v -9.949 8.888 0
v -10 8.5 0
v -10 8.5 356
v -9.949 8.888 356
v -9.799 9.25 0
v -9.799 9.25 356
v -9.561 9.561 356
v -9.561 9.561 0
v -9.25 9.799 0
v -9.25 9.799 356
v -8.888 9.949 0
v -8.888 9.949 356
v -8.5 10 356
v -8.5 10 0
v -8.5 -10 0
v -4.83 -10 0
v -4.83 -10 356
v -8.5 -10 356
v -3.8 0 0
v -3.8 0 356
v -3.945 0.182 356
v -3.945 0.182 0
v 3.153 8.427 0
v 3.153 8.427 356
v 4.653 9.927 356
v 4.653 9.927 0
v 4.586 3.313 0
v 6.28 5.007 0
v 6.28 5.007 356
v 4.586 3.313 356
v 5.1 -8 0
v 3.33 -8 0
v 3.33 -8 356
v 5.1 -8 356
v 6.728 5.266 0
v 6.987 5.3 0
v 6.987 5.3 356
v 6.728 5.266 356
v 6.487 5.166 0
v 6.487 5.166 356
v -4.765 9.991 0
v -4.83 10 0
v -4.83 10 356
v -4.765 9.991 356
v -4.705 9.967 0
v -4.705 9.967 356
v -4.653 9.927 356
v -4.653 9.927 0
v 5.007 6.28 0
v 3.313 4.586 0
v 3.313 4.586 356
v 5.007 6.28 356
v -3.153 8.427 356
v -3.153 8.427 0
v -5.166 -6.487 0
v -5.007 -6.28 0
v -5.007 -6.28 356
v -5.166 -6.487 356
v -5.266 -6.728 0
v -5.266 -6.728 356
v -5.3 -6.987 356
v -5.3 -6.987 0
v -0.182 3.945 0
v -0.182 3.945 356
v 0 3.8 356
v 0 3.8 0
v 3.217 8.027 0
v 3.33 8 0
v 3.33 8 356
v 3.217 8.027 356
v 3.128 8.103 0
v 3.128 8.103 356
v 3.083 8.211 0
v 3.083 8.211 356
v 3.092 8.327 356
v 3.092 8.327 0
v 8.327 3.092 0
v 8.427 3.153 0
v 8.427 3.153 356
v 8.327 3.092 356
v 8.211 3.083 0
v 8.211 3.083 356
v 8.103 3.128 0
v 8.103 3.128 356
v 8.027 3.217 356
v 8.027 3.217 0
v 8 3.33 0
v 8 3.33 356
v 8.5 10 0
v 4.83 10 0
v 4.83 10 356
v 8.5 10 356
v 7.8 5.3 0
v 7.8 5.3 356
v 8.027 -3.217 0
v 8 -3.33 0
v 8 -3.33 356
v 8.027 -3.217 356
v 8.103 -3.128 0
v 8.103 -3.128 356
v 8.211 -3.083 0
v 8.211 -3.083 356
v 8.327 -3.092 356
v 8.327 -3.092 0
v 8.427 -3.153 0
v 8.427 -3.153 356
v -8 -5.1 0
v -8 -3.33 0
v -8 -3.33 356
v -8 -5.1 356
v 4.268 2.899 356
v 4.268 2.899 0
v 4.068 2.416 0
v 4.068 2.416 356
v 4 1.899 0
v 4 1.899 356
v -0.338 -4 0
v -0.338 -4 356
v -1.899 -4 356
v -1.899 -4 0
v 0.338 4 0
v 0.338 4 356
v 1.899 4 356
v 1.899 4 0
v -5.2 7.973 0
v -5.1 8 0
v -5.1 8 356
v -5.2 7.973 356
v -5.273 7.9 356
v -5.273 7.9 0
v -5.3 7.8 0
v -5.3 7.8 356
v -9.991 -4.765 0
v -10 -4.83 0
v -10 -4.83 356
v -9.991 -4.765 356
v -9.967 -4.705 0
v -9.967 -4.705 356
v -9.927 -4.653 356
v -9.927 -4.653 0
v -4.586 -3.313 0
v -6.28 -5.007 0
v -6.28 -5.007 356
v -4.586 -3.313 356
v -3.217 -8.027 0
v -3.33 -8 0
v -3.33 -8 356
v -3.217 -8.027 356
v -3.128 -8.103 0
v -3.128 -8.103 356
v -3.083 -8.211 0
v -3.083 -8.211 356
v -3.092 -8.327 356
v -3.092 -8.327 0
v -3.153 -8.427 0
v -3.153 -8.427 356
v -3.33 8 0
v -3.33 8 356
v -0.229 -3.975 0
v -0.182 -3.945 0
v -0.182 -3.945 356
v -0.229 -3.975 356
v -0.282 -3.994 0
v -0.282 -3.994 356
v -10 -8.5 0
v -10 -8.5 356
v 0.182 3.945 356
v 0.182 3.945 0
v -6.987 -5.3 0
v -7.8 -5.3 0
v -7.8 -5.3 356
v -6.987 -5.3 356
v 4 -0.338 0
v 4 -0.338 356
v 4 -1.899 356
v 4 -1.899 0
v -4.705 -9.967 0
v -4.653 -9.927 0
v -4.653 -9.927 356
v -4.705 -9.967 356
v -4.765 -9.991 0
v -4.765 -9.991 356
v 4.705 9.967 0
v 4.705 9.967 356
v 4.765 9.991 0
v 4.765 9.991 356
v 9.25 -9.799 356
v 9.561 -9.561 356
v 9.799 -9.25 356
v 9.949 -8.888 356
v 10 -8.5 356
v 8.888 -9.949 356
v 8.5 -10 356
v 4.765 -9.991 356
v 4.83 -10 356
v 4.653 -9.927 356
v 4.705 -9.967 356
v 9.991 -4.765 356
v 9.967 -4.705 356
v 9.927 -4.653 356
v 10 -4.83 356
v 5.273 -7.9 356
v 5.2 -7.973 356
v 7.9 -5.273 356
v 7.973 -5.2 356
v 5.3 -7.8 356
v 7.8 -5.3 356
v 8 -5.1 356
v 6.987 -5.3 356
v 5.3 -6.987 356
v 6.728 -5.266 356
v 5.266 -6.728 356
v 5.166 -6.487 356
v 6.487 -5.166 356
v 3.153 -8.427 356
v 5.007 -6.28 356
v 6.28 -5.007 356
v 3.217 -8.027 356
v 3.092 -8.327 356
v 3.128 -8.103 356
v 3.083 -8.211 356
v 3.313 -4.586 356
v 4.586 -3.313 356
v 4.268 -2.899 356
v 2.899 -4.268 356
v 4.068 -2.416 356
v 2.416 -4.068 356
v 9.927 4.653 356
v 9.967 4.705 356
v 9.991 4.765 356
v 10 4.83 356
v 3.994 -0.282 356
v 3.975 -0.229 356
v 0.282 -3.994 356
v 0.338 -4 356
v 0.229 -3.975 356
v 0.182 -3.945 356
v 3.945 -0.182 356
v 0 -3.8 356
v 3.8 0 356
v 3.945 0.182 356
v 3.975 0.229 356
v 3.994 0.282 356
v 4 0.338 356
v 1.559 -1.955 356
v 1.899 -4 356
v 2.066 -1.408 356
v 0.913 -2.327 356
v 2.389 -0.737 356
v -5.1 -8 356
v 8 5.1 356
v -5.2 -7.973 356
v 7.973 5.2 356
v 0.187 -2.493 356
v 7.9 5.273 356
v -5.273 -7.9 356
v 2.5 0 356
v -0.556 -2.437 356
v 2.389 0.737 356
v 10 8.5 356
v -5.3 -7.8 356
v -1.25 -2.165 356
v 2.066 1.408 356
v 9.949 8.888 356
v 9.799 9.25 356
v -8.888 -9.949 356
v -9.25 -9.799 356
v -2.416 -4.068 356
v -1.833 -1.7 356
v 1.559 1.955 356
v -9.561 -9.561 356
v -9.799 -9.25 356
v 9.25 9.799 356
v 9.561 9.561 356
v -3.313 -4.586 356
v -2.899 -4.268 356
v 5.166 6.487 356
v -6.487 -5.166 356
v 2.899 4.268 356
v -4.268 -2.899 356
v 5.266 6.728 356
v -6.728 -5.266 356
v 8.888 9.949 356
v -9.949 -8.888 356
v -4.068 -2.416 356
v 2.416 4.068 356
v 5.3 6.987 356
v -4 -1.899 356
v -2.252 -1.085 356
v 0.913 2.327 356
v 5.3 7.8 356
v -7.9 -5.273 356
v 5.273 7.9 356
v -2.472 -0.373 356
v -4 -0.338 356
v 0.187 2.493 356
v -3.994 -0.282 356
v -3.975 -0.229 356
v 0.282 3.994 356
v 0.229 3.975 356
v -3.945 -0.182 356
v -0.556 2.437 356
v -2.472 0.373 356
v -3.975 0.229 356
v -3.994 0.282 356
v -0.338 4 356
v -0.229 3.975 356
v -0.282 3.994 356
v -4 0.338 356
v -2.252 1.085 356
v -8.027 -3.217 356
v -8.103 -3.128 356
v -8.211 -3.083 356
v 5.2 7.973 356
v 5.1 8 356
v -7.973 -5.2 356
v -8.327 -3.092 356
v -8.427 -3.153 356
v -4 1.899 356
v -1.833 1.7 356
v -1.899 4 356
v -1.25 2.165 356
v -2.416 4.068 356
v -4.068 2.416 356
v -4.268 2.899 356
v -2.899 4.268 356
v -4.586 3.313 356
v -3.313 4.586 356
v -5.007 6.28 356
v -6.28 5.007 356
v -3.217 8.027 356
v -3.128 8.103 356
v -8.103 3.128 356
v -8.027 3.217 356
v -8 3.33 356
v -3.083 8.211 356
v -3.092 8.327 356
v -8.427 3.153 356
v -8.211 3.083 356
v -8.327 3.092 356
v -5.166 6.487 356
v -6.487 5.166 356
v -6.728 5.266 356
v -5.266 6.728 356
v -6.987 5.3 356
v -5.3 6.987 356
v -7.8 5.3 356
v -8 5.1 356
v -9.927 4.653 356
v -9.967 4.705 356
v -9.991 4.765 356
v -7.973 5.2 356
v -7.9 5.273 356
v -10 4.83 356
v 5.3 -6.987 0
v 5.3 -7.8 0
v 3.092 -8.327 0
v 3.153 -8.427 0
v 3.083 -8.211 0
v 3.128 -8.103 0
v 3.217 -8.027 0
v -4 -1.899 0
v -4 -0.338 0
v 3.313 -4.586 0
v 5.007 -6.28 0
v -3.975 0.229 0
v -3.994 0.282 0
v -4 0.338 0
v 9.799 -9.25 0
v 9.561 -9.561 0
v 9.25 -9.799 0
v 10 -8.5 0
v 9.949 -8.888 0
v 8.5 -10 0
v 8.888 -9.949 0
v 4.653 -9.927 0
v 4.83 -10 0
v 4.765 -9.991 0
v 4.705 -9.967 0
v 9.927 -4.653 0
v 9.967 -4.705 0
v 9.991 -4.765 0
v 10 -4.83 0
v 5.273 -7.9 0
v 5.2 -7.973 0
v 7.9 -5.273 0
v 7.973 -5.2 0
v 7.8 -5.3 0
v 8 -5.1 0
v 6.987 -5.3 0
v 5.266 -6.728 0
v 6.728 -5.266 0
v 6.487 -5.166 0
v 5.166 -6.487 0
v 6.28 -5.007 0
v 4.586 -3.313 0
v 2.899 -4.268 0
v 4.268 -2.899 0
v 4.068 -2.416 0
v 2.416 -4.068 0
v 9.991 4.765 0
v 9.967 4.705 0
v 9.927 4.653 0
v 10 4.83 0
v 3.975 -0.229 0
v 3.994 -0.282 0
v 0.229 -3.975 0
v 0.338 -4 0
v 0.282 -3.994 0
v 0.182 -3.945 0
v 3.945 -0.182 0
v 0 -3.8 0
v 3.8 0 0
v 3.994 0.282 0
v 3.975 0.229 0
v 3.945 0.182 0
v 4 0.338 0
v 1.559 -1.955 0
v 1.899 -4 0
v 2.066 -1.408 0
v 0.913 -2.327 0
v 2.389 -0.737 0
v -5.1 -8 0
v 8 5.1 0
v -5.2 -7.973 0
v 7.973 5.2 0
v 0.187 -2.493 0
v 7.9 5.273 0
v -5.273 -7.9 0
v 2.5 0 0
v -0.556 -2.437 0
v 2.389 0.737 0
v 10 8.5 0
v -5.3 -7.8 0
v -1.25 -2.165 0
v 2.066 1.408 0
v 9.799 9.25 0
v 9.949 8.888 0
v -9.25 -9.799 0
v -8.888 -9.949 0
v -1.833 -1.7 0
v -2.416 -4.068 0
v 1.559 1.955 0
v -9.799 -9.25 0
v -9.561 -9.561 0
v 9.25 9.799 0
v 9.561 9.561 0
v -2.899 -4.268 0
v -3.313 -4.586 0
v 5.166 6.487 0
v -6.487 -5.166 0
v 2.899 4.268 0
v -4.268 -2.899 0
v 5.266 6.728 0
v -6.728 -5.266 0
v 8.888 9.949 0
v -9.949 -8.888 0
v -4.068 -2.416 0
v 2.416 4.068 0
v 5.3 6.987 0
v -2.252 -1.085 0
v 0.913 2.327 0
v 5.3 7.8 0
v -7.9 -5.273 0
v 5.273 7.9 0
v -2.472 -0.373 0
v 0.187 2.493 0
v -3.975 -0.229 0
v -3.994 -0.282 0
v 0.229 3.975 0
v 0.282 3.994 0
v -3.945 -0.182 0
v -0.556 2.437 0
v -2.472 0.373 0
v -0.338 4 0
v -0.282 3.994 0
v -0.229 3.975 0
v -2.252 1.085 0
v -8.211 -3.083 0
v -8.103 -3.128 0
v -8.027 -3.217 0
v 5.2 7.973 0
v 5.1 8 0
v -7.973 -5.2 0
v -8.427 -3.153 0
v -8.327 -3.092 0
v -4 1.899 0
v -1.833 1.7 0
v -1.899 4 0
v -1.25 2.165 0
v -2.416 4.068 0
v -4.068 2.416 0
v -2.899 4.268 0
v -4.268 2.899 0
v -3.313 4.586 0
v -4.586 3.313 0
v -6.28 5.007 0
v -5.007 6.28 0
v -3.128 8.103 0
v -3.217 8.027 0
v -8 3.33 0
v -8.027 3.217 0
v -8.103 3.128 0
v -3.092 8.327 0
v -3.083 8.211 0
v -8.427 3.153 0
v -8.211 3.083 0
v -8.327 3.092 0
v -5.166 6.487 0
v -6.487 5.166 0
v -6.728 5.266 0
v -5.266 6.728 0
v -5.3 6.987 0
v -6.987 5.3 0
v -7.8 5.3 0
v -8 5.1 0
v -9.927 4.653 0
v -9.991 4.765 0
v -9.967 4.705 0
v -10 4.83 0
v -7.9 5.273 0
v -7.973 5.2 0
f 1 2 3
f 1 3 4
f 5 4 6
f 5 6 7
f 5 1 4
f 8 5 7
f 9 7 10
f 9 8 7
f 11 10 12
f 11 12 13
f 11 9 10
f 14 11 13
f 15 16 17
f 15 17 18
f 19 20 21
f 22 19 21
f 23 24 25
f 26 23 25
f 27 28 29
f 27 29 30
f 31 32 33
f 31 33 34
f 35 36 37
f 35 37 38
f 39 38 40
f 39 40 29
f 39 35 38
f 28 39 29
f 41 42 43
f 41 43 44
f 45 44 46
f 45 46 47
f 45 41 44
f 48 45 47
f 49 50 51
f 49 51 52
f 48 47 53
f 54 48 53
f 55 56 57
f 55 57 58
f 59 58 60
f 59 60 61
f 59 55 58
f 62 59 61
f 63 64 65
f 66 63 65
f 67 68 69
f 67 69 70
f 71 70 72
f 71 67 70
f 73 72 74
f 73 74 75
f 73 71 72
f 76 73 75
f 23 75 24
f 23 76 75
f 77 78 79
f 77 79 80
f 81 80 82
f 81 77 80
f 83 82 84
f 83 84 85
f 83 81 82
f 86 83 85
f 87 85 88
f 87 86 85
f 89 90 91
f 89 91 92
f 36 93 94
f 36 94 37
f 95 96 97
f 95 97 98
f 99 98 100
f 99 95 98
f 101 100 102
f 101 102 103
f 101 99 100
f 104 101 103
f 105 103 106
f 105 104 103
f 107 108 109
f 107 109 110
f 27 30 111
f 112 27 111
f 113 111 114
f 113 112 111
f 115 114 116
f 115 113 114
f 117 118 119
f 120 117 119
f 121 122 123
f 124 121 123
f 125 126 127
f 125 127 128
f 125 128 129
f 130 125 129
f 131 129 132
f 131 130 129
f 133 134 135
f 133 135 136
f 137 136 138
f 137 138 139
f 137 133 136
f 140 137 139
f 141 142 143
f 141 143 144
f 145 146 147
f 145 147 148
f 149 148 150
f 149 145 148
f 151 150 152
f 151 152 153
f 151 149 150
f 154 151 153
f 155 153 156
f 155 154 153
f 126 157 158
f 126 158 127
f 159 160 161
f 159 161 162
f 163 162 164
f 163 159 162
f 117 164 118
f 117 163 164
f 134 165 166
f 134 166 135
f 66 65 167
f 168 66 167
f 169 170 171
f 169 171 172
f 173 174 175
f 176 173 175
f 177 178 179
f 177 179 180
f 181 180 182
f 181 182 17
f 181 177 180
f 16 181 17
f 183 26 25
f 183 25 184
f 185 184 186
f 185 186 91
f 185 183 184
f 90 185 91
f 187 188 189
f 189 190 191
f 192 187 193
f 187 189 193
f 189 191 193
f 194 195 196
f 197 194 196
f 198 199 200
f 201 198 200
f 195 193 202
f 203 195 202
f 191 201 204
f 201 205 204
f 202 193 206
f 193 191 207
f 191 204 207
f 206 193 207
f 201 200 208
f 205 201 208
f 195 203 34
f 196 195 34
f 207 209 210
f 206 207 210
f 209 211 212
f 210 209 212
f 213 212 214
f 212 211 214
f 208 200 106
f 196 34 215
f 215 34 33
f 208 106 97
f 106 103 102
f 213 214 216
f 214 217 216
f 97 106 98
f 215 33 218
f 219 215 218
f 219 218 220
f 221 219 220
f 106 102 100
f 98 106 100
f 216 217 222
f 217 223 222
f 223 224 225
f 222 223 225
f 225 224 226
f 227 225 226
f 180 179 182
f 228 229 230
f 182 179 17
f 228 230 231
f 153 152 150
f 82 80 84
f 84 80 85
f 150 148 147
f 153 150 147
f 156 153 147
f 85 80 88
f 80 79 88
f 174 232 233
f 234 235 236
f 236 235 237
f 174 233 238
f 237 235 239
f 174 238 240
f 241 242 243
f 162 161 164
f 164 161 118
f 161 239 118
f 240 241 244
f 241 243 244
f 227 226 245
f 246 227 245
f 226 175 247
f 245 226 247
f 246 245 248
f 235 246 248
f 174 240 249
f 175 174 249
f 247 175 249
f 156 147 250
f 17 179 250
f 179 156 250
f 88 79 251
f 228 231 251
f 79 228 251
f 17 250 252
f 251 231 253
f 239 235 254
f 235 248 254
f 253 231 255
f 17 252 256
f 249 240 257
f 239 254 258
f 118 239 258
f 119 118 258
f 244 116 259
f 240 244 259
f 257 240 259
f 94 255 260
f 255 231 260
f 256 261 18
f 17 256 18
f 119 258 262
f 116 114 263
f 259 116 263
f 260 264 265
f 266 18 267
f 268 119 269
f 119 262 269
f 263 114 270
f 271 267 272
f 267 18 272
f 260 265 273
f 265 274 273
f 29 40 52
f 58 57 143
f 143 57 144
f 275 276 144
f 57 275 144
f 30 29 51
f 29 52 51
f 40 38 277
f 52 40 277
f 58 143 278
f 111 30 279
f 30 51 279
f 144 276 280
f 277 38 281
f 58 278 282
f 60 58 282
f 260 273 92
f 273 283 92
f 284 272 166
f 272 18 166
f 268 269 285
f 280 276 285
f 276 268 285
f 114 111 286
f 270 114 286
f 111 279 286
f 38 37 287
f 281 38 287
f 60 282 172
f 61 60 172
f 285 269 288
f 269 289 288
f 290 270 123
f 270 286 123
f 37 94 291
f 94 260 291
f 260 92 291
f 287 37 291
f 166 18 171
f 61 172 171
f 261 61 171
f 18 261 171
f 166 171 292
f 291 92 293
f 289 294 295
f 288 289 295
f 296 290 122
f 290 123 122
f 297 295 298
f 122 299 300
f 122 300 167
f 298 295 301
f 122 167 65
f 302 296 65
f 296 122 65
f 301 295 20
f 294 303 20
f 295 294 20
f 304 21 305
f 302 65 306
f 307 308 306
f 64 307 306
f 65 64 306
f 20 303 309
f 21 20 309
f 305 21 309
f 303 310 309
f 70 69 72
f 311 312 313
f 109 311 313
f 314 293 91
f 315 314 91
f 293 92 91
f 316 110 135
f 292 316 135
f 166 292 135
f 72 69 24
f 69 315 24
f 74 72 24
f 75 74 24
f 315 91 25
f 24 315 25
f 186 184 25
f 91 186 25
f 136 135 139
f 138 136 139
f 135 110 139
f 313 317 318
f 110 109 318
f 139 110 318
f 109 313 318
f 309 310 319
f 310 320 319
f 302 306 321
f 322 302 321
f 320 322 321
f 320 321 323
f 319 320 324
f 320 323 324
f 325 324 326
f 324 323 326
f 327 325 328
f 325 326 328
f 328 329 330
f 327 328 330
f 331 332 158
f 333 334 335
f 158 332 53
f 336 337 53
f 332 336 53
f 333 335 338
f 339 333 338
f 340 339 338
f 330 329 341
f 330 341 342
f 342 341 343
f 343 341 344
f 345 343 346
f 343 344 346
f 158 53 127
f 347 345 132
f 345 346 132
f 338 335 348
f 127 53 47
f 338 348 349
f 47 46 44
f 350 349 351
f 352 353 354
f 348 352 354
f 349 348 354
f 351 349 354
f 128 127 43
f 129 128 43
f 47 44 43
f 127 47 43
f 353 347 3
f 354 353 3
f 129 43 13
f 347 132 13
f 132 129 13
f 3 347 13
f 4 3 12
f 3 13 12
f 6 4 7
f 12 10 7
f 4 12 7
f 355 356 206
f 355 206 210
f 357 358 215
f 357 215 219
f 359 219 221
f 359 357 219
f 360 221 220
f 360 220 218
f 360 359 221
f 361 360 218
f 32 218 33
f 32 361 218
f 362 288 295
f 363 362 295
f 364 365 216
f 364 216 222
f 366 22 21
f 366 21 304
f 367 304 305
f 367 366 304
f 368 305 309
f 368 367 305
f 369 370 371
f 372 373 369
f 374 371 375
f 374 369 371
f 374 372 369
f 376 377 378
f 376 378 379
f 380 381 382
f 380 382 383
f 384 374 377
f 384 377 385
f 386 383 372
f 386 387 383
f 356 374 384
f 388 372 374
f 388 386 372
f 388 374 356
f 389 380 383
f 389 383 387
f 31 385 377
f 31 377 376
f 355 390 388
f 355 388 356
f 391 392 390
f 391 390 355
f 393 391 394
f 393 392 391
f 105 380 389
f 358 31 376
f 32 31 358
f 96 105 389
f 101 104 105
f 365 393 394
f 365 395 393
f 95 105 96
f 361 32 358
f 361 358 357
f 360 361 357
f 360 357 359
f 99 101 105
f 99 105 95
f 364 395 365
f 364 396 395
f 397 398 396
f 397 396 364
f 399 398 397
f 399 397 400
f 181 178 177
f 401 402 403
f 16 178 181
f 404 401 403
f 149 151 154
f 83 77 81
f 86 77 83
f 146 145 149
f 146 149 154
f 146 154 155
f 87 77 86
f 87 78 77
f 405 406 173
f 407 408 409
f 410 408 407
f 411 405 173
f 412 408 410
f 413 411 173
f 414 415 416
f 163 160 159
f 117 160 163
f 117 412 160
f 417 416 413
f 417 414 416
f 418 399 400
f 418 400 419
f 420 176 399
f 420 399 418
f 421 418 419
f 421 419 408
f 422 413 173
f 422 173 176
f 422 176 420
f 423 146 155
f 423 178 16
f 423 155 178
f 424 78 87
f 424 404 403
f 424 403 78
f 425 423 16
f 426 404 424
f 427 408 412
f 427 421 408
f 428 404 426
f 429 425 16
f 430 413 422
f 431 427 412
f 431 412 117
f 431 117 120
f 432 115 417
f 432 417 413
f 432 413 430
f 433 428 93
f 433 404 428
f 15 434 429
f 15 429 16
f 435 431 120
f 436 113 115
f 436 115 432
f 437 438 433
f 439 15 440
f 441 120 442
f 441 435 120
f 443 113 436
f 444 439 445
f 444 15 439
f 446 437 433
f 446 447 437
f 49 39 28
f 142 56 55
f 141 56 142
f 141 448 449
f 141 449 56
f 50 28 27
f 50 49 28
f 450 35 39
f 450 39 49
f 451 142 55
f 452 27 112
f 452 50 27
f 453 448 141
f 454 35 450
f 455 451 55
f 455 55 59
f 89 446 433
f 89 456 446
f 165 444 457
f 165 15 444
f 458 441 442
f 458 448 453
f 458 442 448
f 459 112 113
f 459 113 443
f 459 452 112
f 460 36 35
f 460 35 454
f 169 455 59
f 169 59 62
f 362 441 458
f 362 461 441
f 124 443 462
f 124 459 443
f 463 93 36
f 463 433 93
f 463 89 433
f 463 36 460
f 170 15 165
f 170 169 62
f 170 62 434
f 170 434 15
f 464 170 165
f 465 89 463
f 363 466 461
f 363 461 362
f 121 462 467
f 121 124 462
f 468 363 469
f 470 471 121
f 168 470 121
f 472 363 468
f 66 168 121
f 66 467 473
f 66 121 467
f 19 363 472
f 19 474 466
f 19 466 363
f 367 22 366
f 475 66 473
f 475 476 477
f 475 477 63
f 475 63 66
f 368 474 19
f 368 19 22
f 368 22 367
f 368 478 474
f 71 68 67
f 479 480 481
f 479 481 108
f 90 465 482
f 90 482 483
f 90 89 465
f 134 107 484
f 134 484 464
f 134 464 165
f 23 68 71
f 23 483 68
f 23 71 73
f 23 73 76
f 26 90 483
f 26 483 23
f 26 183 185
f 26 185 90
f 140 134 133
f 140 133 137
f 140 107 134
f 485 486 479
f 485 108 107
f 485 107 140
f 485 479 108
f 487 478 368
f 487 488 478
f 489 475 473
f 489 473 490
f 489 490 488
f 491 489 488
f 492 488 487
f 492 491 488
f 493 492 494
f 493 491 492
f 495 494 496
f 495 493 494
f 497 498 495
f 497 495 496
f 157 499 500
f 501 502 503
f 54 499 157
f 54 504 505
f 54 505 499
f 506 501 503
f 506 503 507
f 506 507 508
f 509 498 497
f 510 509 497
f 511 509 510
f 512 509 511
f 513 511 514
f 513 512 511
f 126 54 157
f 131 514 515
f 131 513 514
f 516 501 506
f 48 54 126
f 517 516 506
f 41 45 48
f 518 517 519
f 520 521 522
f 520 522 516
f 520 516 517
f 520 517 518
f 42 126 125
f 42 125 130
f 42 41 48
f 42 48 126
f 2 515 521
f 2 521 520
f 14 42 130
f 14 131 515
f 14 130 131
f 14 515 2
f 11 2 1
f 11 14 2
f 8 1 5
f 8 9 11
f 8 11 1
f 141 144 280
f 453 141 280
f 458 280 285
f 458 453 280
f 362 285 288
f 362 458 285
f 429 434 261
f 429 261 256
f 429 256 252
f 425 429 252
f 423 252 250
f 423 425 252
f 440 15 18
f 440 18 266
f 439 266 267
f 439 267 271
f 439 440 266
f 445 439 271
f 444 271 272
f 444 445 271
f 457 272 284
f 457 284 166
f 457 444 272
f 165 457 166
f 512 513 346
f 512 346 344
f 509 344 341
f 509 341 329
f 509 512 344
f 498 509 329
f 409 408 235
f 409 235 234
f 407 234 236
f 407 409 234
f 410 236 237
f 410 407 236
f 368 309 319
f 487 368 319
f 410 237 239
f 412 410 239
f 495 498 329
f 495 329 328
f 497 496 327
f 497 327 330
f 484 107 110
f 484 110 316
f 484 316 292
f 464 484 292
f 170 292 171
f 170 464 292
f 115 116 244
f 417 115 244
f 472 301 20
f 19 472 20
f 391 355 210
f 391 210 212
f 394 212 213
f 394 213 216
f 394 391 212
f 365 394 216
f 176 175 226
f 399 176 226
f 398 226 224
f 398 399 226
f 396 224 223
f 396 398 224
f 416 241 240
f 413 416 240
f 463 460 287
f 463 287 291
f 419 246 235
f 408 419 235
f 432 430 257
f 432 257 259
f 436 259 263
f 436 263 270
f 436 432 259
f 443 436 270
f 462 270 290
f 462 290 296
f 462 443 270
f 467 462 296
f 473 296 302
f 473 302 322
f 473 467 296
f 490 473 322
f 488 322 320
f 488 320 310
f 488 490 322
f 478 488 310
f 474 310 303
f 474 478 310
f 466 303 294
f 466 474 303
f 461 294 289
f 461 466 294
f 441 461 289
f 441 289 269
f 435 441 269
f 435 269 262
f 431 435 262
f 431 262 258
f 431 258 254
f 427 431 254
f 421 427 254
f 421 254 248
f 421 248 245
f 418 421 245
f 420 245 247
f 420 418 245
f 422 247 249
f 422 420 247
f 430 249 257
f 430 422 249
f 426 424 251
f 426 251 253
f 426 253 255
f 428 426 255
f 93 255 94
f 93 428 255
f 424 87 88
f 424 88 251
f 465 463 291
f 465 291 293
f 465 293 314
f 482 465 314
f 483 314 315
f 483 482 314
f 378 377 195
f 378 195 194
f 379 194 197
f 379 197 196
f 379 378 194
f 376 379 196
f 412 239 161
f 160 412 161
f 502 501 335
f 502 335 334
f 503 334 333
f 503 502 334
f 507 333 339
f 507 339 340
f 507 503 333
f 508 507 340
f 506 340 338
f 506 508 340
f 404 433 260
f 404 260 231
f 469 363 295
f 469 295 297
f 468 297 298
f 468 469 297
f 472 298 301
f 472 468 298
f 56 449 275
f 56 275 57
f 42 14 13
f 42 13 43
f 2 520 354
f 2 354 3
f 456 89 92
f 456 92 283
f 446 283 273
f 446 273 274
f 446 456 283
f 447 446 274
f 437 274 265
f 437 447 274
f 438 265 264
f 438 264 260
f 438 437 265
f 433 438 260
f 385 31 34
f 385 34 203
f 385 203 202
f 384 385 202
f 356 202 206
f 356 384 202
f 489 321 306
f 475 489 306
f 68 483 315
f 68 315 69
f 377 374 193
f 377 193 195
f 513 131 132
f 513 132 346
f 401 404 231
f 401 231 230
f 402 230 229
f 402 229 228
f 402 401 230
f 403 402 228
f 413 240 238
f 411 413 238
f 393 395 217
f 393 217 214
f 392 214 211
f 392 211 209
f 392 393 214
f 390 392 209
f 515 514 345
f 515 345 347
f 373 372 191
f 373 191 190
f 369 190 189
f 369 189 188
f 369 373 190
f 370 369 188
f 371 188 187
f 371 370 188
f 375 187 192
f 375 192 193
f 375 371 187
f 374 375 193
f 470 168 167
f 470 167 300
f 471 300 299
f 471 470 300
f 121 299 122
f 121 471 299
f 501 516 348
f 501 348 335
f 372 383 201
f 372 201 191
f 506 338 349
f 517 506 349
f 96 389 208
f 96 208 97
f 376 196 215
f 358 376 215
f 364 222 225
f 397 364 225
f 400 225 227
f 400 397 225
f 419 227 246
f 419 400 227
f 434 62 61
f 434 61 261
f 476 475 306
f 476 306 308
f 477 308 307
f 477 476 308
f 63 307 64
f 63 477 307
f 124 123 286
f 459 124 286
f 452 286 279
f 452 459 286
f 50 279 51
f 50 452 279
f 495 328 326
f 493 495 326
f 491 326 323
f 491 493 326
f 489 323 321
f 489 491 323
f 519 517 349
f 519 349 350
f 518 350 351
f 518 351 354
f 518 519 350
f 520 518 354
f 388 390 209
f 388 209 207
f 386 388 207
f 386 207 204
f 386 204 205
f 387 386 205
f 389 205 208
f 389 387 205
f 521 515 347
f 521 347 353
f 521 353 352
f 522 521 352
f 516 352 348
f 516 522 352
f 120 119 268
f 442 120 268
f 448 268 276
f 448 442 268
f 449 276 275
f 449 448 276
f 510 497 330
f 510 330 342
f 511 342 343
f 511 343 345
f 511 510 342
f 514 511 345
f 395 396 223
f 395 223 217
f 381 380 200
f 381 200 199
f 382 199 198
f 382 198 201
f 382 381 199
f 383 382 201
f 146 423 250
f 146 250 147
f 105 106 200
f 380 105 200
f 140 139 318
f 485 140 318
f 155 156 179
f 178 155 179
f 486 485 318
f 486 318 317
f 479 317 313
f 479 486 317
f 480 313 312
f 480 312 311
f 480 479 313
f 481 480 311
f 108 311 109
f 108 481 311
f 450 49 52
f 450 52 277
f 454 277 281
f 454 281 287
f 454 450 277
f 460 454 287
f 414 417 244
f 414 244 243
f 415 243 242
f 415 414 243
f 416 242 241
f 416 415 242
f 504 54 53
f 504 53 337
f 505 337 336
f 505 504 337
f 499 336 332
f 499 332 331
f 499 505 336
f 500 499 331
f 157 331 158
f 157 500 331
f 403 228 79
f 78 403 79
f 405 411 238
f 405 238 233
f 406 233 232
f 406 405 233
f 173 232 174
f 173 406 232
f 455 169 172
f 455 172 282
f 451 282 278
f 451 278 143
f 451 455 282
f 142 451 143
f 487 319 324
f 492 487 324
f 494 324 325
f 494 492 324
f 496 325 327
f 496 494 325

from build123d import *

# Parameters (mm, degrees)
MODEL_R             = 2.5
EXTRUDED_BODY_DEPTH = 356


with BuildPart() as part:
    # Model → Extruded body (new body)
    with BuildSketch(Plane.XY):
        with BuildLine():
            Line((-4, 0.337695265), (-4, 1.898780669))
            ThreePointArc((-4, 1.898780669), (-4.152240935, 2.664147534), (-4.585786438, 3.312994231))
            Line((-4.585786438, 3.312994231), (-6.279898987, 5.007106781))
            ThreePointArc((-6.279898987, 5.007106781), (-6.604322336, 5.223879533), (-6.987005769, 5.3))
            Line((-6.987005769, 5.3), (-7.8, 5.3))
            ThreePointArc((-7.8, 5.3), (-7.941421356, 5.241421356), (-8, 5.1))
            Line((-8, 5.1), (-8, 3.33))
            ThreePointArc((-8, 3.33), (-8.154329142, 3.099030117), (-8.426776695, 3.153223305))
            Line((-8.426776695, 3.153223305), (-9.926776695, 4.653223305))
            ThreePointArc((-9.926776695, 4.653223305), (-9.980969883, 4.734329142), (-10, 4.83))
            Line((-10, 4.83), (-10, 8.5))
            ThreePointArc((-10, 8.5), (-9.560660172, 9.560660172), (-8.5, 10))
            Line((-8.5, 10), (-4.83, 10))
            ThreePointArc((-4.83, 10), (-4.734329142, 9.980969883), (-4.653223305, 9.926776695))
            Line((-4.653223305, 9.926776695), (-3.153223305, 8.426776695))
            ThreePointArc((-3.153223305, 8.426776695), (-3.099030117, 8.154329142), (-3.33, 8))
            Line((-3.33, 8), (-5.1, 8))
            ThreePointArc((-5.1, 8), (-5.241421356, 7.941421356), (-5.3, 7.8))
            Line((-5.3, 7.8), (-5.3, 6.987005769))
            ThreePointArc((-5.3, 6.987005769), (-5.223879533, 6.604322336), (-5.007106781, 6.279898987))
            Line((-5.007106781, 6.279898987), (-3.312994231, 4.585786438))
            ThreePointArc((-3.312994231, 4.585786438), (-2.664147534, 4.152240935), (-1.898780669, 4))
            Line((-1.898780669, 4), (-0.337695265, 4))
            ThreePointArc((-0.337695265, 4), (-0.254943529, 3.98590708), (-0.181521503, 3.945217202))
            Line((-0.181521503, 3.945217202), (0, 3.8))
            Line((0, 3.8), (0.181521503, 3.945217202))
            ThreePointArc((0.181521503, 3.945217202), (0.254943529, 3.98590708), (0.337695265, 4))
            Line((0.337695265, 4), (1.898780669, 4))
            ThreePointArc((1.898780669, 4), (2.664147534, 4.152240935), (3.312994231, 4.585786438))
            Line((3.312994231, 4.585786438), (5.007106781, 6.279898987))
            ThreePointArc((5.007106781, 6.279898987), (5.223879533, 6.604322336), (5.3, 6.987005769))
            Line((5.3, 6.987005769), (5.3, 7.8))
            ThreePointArc((5.3, 7.8), (5.241421356, 7.941421356), (5.1, 8))
            Line((5.1, 8), (3.33, 8))
            ThreePointArc((3.33, 8), (3.099030117, 8.154329142), (3.153223305, 8.426776695))
            Line((3.153223305, 8.426776695), (4.653223305, 9.926776695))
            ThreePointArc((4.653223305, 9.926776695), (4.734329142, 9.980969883), (4.83, 10))
            Line((4.83, 10), (8.5, 10))
            ThreePointArc((8.5, 10), (9.560660172, 9.560660172), (10, 8.5))
            Line((10, 8.5), (10, 4.83))
            ThreePointArc((10, 4.83), (9.980969883, 4.734329142), (9.926776695, 4.653223305))
            Line((9.926776695, 4.653223305), (8.426776695, 3.153223305))
            ThreePointArc((8.426776695, 3.153223305), (8.154329142, 3.099030117), (8, 3.33))
            Line((8, 3.33), (8, 5.1))
            ThreePointArc((8, 5.1), (7.941421356, 5.241421356), (7.8, 5.3))
            Line((7.8, 5.3), (6.987005769, 5.3))
            ThreePointArc((6.987005769, 5.3), (6.604322336, 5.223879533), (6.279898987, 5.007106781))
            Line((6.279898987, 5.007106781), (4.585786438, 3.312994231))
            ThreePointArc((4.585786438, 3.312994231), (4.152240935, 2.664147534), (4, 1.898780669))
            Line((4, 1.898780669), (4, 0.337695265))
            ThreePointArc((4, 0.337695265), (3.98590708, 0.254943529), (3.945217202, 0.181521503))
            Line((3.945217202, 0.181521503), (3.8, 0))
            Line((3.8, 0), (3.945217202, -0.181521503))
            ThreePointArc((3.945217202, -0.181521503), (3.98590708, -0.254943529), (4, -0.337695265))
            Line((4, -0.337695265), (4, -1.898780669))
            ThreePointArc((4, -1.898780669), (4.152240935, -2.664147534), (4.585786438, -3.312994231))
            Line((4.585786438, -3.312994231), (6.279898987, -5.007106781))
            ThreePointArc((6.279898987, -5.007106781), (6.604322336, -5.223879533), (6.987005769, -5.3))
            Line((6.987005769, -5.3), (7.8, -5.3))
            ThreePointArc((7.8, -5.3), (7.941421356, -5.241421356), (8, -5.1))
            Line((8, -5.1), (8, -3.33))
            ThreePointArc((8, -3.33), (8.154329142, -3.099030117), (8.426776695, -3.153223305))
            Line((8.426776695, -3.153223305), (9.926776695, -4.653223305))
            ThreePointArc((9.926776695, -4.653223305), (9.980969883, -4.734329142), (10, -4.83))
            Line((10, -4.83), (10, -8.5))
            ThreePointArc((10, -8.5), (9.560660172, -9.560660172), (8.5, -10))
            Line((8.5, -10), (4.83, -10))
            ThreePointArc((4.83, -10), (4.734329142, -9.980969883), (4.653223305, -9.926776695))
            Line((4.653223305, -9.926776695), (3.153223305, -8.426776695))
            ThreePointArc((3.153223305, -8.426776695), (3.099030117, -8.154329142), (3.33, -8))
            Line((3.33, -8), (5.1, -8))
            ThreePointArc((5.1, -8), (5.241421356, -7.941421356), (5.3, -7.8))
            Line((5.3, -7.8), (5.3, -6.987005769))
            ThreePointArc((5.3, -6.987005769), (5.223879533, -6.604322336), (5.007106781, -6.279898987))
            Line((5.007106781, -6.279898987), (3.312994231, -4.585786438))
            ThreePointArc((3.312994231, -4.585786438), (2.664147534, -4.152240935), (1.898780669, -4))
            Line((1.898780669, -4), (0.337695265, -4))
            ThreePointArc((0.337695265, -4), (0.254943529, -3.98590708), (0.181521503, -3.945217202))
            Line((0.181521503, -3.945217202), (0, -3.8))
            Line((0, -3.8), (-0.181521503, -3.945217202))
            ThreePointArc((-0.181521503, -3.945217202), (-0.254943529, -3.98590708), (-0.337695265, -4))
            Line((-0.337695265, -4), (-1.898780669, -4))
            ThreePointArc((-1.898780669, -4), (-2.664147534, -4.152240935), (-3.312994231, -4.585786438))
            Line((-3.312994231, -4.585786438), (-5.007106781, -6.279898987))
            ThreePointArc((-5.007106781, -6.279898987), (-5.223879533, -6.604322336), (-5.3, -6.987005769))
            Line((-5.3, -6.987005769), (-5.3, -7.8))
            ThreePointArc((-5.3, -7.8), (-5.241421356, -7.941421356), (-5.1, -8))
            Line((-5.1, -8), (-3.33, -8))
            ThreePointArc((-3.33, -8), (-3.099030117, -8.154329142), (-3.153223305, -8.426776695))
            Line((-3.153223305, -8.426776695), (-4.653223305, -9.926776695))
            ThreePointArc((-4.653223305, -9.926776695), (-4.734329142, -9.980969883), (-4.83, -10))
            Line((-4.83, -10), (-8.5, -10))
            ThreePointArc((-8.5, -10), (-9.560660172, -9.560660172), (-10, -8.5))
            Line((-10, -8.5), (-10, -4.83))
            ThreePointArc((-10, -4.83), (-9.980969883, -4.734329142), (-9.926776695, -4.653223305))
            Line((-9.926776695, -4.653223305), (-8.426776695, -3.153223305))
            ThreePointArc((-8.426776695, -3.153223305), (-8.154329142, -3.099030117), (-8, -3.33))
            Line((-8, -3.33), (-8, -5.1))
            ThreePointArc((-8, -5.1), (-7.941421356, -5.241421356), (-7.8, -5.3))
            Line((-7.8, -5.3), (-6.987005769, -5.3))
            ThreePointArc((-6.987005769, -5.3), (-6.604322336, -5.223879533), (-6.279898987, -5.007106781))
            Line((-6.279898987, -5.007106781), (-4.585786438, -3.312994231))
            ThreePointArc((-4.585786438, -3.312994231), (-4.152240935, -2.664147534), (-4, -1.898780669))
            Line((-4, -1.898780669), (-4, -0.337695265))
            ThreePointArc((-4, -0.337695265), (-3.98590708, -0.254943529), (-3.945217202, -0.181521503))
            Line((-3.945217202, -0.181521503), (-3.8, 0))
            Line((-3.8, 0), (-3.945217202, 0.181521503))
            ThreePointArc((-3.945217202, 0.181521503), (-3.98590708, 0.254943529), (-4, 0.337695265))
        make_face()
        Circle(MODEL_R, mode=Mode.SUBTRACT)
    extrude(amount=EXTRUDED_BODY_DEPTH)


solid = part.part
